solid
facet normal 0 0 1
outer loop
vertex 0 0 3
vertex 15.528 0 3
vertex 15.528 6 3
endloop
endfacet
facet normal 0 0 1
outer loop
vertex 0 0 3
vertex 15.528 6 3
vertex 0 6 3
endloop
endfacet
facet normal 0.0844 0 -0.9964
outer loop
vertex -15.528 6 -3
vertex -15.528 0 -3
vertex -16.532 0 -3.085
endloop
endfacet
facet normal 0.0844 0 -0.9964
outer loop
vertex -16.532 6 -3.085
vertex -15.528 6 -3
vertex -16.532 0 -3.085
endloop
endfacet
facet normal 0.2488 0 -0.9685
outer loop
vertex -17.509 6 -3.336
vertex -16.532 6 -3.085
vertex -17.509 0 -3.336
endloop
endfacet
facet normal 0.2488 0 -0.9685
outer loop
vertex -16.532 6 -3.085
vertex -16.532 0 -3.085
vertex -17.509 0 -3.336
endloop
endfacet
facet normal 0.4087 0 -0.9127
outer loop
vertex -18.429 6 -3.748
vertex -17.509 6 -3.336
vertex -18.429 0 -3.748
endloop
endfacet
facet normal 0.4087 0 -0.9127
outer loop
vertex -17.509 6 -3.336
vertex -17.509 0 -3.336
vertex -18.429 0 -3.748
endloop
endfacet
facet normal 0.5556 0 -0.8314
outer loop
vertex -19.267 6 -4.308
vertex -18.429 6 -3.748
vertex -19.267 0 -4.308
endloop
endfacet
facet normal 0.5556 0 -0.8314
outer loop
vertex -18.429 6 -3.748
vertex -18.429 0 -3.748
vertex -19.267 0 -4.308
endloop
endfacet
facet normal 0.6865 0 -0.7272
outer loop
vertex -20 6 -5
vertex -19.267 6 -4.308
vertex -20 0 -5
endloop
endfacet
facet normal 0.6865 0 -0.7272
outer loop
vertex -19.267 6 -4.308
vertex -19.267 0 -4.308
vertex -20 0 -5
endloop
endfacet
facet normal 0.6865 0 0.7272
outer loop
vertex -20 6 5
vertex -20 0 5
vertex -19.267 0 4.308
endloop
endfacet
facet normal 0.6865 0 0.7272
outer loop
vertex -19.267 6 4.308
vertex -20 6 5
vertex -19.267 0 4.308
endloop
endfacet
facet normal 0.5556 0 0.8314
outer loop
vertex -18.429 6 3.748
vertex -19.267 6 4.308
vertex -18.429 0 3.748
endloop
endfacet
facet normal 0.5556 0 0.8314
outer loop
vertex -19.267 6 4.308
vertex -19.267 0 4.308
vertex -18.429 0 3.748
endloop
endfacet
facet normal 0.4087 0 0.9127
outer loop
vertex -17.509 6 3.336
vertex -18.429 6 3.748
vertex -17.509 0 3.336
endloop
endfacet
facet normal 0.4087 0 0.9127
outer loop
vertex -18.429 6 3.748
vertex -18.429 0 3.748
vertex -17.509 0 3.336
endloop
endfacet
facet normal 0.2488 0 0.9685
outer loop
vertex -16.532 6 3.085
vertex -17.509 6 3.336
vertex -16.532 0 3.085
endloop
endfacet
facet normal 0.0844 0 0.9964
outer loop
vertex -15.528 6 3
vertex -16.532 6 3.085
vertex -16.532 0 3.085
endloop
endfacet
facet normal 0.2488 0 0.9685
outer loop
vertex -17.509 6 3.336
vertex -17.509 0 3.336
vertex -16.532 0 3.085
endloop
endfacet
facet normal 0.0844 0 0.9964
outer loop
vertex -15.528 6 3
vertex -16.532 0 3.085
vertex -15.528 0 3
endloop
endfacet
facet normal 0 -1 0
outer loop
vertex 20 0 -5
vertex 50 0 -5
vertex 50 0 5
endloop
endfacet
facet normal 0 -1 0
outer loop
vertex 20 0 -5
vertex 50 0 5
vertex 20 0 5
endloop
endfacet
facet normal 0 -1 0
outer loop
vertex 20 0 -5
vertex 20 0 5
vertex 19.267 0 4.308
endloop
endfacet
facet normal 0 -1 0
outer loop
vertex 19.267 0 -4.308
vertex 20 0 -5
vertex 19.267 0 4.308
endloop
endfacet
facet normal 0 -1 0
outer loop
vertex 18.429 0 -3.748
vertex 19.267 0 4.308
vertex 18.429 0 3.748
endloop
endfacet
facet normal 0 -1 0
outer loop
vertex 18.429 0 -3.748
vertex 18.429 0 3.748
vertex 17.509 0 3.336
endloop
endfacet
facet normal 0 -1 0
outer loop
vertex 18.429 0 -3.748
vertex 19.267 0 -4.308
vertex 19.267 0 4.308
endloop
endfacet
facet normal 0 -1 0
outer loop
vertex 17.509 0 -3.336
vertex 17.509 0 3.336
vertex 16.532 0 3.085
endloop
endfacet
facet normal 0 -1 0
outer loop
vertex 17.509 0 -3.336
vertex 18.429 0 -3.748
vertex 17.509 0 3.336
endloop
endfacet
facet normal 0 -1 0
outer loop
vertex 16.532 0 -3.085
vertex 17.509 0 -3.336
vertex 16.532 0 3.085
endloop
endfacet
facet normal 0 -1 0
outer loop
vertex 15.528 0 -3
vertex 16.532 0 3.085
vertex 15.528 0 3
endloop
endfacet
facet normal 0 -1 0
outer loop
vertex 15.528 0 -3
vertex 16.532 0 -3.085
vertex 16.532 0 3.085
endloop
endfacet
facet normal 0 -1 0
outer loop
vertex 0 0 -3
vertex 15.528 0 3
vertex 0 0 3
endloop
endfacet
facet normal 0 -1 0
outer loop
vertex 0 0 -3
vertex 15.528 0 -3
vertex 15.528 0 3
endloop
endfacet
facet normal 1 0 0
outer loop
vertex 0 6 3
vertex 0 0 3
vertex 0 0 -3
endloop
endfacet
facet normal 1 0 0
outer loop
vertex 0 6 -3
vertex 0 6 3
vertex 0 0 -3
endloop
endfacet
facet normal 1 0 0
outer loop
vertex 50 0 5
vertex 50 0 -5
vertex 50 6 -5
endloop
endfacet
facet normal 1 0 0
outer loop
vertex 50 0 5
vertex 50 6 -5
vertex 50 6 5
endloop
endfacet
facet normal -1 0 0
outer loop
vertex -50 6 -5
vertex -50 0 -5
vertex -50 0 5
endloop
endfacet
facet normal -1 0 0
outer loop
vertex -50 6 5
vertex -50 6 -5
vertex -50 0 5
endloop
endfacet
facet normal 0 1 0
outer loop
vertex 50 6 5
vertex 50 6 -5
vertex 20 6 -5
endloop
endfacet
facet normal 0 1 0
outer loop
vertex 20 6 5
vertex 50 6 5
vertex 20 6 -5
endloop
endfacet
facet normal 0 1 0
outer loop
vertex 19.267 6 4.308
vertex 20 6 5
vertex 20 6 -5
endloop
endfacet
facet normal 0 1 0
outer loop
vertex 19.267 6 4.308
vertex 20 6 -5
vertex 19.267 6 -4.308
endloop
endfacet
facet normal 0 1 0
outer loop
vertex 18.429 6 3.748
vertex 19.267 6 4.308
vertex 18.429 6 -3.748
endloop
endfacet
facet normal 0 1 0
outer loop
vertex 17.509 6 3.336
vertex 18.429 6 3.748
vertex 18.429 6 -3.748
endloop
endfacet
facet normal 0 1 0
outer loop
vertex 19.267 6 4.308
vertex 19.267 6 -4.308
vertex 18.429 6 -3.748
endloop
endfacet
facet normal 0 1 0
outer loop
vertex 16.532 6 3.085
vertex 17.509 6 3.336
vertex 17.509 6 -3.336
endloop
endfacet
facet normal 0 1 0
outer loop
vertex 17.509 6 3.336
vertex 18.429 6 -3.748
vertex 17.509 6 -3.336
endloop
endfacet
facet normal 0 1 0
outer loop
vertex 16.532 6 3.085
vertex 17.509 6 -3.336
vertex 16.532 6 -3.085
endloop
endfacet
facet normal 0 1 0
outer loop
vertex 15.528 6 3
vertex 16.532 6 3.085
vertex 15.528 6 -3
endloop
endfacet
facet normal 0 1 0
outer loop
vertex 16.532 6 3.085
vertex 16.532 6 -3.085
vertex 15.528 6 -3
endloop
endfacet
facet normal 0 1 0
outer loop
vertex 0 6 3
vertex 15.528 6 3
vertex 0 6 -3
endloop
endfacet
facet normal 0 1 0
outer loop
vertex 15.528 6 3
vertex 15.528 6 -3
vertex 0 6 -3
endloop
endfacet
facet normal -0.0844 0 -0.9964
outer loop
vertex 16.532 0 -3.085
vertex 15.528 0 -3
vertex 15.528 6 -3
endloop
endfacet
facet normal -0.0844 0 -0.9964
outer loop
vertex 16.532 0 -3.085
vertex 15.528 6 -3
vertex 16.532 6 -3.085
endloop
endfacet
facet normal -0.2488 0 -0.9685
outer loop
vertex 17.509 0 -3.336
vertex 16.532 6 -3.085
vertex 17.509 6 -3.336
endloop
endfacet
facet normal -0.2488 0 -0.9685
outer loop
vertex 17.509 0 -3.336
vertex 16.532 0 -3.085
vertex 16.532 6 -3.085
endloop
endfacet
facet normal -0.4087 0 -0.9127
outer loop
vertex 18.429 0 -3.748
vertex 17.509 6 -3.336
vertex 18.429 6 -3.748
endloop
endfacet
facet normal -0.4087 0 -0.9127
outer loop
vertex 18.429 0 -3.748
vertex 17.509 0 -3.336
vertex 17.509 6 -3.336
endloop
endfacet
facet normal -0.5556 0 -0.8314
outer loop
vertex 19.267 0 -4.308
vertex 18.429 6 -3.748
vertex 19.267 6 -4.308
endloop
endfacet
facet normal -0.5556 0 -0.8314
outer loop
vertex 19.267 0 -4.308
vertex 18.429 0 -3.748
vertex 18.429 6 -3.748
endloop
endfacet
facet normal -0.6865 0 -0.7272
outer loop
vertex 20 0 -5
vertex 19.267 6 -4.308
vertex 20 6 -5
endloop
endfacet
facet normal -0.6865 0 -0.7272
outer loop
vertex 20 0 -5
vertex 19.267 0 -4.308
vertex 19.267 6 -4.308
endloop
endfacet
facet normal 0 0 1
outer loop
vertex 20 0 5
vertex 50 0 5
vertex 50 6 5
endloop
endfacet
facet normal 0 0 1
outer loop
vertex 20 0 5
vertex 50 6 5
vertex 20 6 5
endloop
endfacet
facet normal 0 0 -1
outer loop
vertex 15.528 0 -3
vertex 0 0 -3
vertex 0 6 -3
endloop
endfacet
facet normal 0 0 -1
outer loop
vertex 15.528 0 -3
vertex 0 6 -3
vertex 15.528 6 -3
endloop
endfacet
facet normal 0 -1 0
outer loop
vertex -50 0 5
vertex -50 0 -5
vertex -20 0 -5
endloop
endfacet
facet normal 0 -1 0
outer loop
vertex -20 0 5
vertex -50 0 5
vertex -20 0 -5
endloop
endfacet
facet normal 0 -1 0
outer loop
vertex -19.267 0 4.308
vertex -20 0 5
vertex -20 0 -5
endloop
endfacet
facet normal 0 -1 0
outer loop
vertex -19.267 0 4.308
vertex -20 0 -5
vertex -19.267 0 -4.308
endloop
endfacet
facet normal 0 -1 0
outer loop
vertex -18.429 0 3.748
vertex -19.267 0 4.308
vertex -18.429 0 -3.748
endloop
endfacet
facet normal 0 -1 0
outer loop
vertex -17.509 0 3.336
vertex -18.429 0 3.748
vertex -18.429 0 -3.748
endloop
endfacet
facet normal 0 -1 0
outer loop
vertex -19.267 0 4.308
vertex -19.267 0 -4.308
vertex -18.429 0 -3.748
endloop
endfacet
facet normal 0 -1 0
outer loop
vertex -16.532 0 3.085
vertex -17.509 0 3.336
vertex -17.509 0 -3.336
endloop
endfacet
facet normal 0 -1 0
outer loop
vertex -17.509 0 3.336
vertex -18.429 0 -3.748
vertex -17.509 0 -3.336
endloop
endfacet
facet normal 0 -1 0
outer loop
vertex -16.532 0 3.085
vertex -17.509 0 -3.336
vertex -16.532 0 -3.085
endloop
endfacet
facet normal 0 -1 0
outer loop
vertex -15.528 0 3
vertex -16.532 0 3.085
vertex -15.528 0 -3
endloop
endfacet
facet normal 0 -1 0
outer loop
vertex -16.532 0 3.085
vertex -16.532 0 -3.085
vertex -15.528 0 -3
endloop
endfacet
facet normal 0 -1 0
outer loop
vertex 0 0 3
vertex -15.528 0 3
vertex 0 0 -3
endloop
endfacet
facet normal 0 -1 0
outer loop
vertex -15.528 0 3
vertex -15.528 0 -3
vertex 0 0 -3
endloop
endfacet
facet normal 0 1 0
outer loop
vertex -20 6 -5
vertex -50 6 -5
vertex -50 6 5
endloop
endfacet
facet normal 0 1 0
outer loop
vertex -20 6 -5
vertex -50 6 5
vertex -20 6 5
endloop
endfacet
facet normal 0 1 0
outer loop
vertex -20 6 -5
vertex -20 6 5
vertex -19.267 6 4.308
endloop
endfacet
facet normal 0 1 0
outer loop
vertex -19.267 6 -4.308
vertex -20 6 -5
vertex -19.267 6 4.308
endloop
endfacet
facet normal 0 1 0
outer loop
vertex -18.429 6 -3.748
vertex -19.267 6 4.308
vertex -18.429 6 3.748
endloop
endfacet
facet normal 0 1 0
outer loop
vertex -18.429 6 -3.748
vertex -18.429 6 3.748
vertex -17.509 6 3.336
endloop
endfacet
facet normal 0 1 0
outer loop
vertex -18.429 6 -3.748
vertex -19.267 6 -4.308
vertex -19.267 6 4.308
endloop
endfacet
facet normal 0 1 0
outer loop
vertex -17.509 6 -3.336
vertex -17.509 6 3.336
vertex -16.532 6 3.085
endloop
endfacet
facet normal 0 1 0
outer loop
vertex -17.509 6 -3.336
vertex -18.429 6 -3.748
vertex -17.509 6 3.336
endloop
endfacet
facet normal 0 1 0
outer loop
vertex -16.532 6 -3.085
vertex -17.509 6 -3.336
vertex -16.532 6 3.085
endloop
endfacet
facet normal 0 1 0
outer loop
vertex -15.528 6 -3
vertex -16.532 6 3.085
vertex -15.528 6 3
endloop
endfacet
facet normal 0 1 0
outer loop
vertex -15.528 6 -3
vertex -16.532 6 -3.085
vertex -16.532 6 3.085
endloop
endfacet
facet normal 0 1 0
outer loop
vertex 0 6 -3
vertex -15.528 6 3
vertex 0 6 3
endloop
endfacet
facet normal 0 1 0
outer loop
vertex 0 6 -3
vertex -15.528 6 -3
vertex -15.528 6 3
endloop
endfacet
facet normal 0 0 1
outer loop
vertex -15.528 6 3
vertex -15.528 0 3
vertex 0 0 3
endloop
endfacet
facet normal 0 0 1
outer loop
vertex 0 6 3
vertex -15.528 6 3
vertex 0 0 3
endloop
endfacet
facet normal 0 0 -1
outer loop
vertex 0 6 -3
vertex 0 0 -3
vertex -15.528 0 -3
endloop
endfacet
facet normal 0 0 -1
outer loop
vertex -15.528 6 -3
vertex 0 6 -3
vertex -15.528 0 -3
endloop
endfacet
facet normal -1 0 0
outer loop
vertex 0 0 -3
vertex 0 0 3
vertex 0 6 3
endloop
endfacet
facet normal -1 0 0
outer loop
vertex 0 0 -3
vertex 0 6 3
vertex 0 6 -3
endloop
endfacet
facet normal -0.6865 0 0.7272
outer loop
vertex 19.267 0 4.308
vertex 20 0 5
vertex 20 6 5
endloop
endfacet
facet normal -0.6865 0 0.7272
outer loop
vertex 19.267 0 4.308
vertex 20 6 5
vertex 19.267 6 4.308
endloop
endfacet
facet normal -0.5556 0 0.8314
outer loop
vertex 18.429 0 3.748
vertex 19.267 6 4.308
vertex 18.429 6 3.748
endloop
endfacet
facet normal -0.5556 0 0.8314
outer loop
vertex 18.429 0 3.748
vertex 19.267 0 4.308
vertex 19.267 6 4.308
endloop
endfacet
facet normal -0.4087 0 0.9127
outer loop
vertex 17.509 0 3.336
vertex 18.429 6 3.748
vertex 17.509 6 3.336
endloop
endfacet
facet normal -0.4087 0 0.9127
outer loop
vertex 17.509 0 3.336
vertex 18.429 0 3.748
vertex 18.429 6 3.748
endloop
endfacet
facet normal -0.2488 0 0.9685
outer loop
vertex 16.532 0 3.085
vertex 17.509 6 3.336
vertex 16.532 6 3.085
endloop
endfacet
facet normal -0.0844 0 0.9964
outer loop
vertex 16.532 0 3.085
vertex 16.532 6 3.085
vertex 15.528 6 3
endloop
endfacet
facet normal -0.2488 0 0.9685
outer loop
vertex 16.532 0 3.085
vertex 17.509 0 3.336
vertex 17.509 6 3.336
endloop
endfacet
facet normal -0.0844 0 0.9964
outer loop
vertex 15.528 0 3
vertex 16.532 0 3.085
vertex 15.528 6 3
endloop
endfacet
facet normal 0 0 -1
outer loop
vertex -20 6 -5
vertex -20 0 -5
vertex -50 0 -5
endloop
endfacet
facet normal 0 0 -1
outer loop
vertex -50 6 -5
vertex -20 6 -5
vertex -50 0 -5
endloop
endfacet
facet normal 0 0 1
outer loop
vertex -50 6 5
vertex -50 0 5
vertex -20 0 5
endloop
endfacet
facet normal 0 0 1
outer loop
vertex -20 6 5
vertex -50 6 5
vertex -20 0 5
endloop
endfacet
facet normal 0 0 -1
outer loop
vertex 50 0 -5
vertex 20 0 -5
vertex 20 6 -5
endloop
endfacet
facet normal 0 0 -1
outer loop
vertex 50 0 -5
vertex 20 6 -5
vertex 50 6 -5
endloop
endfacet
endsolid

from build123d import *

# Parameters (mm, degrees)
BOSS_EXTRUDE1_DEPTH = 6


with BuildPart() as part:
    # Sketch1 → Boss-Extrude1 (new body)
    with BuildSketch(Plane(origin=(0, 0, 0), x_dir=(1, 0, 0), z_dir=(0, 1, 0))):
        with BuildLine():
            Line((0, -3), (0, 3))
            Line((0, 3), (-15.527864045, 3))
            ThreePointArc((-15.527864045, 3), (-17.977353788, 3.522774425), (-20, 5))
            Line((-20, 5), (-50, 5))
            Line((-50, 5), (-50, -5))
            Line((-50, -5), (-20, -5))
            ThreePointArc((-20, -5), (-17.977353788, -3.522774425), (-15.527864045, -3))
            Line((-15.527864045, -3), (0, -3))
        make_face()
    extrude(amount=BOSS_EXTRUDE1_DEPTH)


with BuildPart() as body_2:
    # Mirror1: mirrored copy
    add(part.part.mirror(Plane(origin=(0, 0, 0), x_dir=(0, 0, 1), z_dir=(1, 0, 0))))


solid = Compound([part.part, body_2.part])
